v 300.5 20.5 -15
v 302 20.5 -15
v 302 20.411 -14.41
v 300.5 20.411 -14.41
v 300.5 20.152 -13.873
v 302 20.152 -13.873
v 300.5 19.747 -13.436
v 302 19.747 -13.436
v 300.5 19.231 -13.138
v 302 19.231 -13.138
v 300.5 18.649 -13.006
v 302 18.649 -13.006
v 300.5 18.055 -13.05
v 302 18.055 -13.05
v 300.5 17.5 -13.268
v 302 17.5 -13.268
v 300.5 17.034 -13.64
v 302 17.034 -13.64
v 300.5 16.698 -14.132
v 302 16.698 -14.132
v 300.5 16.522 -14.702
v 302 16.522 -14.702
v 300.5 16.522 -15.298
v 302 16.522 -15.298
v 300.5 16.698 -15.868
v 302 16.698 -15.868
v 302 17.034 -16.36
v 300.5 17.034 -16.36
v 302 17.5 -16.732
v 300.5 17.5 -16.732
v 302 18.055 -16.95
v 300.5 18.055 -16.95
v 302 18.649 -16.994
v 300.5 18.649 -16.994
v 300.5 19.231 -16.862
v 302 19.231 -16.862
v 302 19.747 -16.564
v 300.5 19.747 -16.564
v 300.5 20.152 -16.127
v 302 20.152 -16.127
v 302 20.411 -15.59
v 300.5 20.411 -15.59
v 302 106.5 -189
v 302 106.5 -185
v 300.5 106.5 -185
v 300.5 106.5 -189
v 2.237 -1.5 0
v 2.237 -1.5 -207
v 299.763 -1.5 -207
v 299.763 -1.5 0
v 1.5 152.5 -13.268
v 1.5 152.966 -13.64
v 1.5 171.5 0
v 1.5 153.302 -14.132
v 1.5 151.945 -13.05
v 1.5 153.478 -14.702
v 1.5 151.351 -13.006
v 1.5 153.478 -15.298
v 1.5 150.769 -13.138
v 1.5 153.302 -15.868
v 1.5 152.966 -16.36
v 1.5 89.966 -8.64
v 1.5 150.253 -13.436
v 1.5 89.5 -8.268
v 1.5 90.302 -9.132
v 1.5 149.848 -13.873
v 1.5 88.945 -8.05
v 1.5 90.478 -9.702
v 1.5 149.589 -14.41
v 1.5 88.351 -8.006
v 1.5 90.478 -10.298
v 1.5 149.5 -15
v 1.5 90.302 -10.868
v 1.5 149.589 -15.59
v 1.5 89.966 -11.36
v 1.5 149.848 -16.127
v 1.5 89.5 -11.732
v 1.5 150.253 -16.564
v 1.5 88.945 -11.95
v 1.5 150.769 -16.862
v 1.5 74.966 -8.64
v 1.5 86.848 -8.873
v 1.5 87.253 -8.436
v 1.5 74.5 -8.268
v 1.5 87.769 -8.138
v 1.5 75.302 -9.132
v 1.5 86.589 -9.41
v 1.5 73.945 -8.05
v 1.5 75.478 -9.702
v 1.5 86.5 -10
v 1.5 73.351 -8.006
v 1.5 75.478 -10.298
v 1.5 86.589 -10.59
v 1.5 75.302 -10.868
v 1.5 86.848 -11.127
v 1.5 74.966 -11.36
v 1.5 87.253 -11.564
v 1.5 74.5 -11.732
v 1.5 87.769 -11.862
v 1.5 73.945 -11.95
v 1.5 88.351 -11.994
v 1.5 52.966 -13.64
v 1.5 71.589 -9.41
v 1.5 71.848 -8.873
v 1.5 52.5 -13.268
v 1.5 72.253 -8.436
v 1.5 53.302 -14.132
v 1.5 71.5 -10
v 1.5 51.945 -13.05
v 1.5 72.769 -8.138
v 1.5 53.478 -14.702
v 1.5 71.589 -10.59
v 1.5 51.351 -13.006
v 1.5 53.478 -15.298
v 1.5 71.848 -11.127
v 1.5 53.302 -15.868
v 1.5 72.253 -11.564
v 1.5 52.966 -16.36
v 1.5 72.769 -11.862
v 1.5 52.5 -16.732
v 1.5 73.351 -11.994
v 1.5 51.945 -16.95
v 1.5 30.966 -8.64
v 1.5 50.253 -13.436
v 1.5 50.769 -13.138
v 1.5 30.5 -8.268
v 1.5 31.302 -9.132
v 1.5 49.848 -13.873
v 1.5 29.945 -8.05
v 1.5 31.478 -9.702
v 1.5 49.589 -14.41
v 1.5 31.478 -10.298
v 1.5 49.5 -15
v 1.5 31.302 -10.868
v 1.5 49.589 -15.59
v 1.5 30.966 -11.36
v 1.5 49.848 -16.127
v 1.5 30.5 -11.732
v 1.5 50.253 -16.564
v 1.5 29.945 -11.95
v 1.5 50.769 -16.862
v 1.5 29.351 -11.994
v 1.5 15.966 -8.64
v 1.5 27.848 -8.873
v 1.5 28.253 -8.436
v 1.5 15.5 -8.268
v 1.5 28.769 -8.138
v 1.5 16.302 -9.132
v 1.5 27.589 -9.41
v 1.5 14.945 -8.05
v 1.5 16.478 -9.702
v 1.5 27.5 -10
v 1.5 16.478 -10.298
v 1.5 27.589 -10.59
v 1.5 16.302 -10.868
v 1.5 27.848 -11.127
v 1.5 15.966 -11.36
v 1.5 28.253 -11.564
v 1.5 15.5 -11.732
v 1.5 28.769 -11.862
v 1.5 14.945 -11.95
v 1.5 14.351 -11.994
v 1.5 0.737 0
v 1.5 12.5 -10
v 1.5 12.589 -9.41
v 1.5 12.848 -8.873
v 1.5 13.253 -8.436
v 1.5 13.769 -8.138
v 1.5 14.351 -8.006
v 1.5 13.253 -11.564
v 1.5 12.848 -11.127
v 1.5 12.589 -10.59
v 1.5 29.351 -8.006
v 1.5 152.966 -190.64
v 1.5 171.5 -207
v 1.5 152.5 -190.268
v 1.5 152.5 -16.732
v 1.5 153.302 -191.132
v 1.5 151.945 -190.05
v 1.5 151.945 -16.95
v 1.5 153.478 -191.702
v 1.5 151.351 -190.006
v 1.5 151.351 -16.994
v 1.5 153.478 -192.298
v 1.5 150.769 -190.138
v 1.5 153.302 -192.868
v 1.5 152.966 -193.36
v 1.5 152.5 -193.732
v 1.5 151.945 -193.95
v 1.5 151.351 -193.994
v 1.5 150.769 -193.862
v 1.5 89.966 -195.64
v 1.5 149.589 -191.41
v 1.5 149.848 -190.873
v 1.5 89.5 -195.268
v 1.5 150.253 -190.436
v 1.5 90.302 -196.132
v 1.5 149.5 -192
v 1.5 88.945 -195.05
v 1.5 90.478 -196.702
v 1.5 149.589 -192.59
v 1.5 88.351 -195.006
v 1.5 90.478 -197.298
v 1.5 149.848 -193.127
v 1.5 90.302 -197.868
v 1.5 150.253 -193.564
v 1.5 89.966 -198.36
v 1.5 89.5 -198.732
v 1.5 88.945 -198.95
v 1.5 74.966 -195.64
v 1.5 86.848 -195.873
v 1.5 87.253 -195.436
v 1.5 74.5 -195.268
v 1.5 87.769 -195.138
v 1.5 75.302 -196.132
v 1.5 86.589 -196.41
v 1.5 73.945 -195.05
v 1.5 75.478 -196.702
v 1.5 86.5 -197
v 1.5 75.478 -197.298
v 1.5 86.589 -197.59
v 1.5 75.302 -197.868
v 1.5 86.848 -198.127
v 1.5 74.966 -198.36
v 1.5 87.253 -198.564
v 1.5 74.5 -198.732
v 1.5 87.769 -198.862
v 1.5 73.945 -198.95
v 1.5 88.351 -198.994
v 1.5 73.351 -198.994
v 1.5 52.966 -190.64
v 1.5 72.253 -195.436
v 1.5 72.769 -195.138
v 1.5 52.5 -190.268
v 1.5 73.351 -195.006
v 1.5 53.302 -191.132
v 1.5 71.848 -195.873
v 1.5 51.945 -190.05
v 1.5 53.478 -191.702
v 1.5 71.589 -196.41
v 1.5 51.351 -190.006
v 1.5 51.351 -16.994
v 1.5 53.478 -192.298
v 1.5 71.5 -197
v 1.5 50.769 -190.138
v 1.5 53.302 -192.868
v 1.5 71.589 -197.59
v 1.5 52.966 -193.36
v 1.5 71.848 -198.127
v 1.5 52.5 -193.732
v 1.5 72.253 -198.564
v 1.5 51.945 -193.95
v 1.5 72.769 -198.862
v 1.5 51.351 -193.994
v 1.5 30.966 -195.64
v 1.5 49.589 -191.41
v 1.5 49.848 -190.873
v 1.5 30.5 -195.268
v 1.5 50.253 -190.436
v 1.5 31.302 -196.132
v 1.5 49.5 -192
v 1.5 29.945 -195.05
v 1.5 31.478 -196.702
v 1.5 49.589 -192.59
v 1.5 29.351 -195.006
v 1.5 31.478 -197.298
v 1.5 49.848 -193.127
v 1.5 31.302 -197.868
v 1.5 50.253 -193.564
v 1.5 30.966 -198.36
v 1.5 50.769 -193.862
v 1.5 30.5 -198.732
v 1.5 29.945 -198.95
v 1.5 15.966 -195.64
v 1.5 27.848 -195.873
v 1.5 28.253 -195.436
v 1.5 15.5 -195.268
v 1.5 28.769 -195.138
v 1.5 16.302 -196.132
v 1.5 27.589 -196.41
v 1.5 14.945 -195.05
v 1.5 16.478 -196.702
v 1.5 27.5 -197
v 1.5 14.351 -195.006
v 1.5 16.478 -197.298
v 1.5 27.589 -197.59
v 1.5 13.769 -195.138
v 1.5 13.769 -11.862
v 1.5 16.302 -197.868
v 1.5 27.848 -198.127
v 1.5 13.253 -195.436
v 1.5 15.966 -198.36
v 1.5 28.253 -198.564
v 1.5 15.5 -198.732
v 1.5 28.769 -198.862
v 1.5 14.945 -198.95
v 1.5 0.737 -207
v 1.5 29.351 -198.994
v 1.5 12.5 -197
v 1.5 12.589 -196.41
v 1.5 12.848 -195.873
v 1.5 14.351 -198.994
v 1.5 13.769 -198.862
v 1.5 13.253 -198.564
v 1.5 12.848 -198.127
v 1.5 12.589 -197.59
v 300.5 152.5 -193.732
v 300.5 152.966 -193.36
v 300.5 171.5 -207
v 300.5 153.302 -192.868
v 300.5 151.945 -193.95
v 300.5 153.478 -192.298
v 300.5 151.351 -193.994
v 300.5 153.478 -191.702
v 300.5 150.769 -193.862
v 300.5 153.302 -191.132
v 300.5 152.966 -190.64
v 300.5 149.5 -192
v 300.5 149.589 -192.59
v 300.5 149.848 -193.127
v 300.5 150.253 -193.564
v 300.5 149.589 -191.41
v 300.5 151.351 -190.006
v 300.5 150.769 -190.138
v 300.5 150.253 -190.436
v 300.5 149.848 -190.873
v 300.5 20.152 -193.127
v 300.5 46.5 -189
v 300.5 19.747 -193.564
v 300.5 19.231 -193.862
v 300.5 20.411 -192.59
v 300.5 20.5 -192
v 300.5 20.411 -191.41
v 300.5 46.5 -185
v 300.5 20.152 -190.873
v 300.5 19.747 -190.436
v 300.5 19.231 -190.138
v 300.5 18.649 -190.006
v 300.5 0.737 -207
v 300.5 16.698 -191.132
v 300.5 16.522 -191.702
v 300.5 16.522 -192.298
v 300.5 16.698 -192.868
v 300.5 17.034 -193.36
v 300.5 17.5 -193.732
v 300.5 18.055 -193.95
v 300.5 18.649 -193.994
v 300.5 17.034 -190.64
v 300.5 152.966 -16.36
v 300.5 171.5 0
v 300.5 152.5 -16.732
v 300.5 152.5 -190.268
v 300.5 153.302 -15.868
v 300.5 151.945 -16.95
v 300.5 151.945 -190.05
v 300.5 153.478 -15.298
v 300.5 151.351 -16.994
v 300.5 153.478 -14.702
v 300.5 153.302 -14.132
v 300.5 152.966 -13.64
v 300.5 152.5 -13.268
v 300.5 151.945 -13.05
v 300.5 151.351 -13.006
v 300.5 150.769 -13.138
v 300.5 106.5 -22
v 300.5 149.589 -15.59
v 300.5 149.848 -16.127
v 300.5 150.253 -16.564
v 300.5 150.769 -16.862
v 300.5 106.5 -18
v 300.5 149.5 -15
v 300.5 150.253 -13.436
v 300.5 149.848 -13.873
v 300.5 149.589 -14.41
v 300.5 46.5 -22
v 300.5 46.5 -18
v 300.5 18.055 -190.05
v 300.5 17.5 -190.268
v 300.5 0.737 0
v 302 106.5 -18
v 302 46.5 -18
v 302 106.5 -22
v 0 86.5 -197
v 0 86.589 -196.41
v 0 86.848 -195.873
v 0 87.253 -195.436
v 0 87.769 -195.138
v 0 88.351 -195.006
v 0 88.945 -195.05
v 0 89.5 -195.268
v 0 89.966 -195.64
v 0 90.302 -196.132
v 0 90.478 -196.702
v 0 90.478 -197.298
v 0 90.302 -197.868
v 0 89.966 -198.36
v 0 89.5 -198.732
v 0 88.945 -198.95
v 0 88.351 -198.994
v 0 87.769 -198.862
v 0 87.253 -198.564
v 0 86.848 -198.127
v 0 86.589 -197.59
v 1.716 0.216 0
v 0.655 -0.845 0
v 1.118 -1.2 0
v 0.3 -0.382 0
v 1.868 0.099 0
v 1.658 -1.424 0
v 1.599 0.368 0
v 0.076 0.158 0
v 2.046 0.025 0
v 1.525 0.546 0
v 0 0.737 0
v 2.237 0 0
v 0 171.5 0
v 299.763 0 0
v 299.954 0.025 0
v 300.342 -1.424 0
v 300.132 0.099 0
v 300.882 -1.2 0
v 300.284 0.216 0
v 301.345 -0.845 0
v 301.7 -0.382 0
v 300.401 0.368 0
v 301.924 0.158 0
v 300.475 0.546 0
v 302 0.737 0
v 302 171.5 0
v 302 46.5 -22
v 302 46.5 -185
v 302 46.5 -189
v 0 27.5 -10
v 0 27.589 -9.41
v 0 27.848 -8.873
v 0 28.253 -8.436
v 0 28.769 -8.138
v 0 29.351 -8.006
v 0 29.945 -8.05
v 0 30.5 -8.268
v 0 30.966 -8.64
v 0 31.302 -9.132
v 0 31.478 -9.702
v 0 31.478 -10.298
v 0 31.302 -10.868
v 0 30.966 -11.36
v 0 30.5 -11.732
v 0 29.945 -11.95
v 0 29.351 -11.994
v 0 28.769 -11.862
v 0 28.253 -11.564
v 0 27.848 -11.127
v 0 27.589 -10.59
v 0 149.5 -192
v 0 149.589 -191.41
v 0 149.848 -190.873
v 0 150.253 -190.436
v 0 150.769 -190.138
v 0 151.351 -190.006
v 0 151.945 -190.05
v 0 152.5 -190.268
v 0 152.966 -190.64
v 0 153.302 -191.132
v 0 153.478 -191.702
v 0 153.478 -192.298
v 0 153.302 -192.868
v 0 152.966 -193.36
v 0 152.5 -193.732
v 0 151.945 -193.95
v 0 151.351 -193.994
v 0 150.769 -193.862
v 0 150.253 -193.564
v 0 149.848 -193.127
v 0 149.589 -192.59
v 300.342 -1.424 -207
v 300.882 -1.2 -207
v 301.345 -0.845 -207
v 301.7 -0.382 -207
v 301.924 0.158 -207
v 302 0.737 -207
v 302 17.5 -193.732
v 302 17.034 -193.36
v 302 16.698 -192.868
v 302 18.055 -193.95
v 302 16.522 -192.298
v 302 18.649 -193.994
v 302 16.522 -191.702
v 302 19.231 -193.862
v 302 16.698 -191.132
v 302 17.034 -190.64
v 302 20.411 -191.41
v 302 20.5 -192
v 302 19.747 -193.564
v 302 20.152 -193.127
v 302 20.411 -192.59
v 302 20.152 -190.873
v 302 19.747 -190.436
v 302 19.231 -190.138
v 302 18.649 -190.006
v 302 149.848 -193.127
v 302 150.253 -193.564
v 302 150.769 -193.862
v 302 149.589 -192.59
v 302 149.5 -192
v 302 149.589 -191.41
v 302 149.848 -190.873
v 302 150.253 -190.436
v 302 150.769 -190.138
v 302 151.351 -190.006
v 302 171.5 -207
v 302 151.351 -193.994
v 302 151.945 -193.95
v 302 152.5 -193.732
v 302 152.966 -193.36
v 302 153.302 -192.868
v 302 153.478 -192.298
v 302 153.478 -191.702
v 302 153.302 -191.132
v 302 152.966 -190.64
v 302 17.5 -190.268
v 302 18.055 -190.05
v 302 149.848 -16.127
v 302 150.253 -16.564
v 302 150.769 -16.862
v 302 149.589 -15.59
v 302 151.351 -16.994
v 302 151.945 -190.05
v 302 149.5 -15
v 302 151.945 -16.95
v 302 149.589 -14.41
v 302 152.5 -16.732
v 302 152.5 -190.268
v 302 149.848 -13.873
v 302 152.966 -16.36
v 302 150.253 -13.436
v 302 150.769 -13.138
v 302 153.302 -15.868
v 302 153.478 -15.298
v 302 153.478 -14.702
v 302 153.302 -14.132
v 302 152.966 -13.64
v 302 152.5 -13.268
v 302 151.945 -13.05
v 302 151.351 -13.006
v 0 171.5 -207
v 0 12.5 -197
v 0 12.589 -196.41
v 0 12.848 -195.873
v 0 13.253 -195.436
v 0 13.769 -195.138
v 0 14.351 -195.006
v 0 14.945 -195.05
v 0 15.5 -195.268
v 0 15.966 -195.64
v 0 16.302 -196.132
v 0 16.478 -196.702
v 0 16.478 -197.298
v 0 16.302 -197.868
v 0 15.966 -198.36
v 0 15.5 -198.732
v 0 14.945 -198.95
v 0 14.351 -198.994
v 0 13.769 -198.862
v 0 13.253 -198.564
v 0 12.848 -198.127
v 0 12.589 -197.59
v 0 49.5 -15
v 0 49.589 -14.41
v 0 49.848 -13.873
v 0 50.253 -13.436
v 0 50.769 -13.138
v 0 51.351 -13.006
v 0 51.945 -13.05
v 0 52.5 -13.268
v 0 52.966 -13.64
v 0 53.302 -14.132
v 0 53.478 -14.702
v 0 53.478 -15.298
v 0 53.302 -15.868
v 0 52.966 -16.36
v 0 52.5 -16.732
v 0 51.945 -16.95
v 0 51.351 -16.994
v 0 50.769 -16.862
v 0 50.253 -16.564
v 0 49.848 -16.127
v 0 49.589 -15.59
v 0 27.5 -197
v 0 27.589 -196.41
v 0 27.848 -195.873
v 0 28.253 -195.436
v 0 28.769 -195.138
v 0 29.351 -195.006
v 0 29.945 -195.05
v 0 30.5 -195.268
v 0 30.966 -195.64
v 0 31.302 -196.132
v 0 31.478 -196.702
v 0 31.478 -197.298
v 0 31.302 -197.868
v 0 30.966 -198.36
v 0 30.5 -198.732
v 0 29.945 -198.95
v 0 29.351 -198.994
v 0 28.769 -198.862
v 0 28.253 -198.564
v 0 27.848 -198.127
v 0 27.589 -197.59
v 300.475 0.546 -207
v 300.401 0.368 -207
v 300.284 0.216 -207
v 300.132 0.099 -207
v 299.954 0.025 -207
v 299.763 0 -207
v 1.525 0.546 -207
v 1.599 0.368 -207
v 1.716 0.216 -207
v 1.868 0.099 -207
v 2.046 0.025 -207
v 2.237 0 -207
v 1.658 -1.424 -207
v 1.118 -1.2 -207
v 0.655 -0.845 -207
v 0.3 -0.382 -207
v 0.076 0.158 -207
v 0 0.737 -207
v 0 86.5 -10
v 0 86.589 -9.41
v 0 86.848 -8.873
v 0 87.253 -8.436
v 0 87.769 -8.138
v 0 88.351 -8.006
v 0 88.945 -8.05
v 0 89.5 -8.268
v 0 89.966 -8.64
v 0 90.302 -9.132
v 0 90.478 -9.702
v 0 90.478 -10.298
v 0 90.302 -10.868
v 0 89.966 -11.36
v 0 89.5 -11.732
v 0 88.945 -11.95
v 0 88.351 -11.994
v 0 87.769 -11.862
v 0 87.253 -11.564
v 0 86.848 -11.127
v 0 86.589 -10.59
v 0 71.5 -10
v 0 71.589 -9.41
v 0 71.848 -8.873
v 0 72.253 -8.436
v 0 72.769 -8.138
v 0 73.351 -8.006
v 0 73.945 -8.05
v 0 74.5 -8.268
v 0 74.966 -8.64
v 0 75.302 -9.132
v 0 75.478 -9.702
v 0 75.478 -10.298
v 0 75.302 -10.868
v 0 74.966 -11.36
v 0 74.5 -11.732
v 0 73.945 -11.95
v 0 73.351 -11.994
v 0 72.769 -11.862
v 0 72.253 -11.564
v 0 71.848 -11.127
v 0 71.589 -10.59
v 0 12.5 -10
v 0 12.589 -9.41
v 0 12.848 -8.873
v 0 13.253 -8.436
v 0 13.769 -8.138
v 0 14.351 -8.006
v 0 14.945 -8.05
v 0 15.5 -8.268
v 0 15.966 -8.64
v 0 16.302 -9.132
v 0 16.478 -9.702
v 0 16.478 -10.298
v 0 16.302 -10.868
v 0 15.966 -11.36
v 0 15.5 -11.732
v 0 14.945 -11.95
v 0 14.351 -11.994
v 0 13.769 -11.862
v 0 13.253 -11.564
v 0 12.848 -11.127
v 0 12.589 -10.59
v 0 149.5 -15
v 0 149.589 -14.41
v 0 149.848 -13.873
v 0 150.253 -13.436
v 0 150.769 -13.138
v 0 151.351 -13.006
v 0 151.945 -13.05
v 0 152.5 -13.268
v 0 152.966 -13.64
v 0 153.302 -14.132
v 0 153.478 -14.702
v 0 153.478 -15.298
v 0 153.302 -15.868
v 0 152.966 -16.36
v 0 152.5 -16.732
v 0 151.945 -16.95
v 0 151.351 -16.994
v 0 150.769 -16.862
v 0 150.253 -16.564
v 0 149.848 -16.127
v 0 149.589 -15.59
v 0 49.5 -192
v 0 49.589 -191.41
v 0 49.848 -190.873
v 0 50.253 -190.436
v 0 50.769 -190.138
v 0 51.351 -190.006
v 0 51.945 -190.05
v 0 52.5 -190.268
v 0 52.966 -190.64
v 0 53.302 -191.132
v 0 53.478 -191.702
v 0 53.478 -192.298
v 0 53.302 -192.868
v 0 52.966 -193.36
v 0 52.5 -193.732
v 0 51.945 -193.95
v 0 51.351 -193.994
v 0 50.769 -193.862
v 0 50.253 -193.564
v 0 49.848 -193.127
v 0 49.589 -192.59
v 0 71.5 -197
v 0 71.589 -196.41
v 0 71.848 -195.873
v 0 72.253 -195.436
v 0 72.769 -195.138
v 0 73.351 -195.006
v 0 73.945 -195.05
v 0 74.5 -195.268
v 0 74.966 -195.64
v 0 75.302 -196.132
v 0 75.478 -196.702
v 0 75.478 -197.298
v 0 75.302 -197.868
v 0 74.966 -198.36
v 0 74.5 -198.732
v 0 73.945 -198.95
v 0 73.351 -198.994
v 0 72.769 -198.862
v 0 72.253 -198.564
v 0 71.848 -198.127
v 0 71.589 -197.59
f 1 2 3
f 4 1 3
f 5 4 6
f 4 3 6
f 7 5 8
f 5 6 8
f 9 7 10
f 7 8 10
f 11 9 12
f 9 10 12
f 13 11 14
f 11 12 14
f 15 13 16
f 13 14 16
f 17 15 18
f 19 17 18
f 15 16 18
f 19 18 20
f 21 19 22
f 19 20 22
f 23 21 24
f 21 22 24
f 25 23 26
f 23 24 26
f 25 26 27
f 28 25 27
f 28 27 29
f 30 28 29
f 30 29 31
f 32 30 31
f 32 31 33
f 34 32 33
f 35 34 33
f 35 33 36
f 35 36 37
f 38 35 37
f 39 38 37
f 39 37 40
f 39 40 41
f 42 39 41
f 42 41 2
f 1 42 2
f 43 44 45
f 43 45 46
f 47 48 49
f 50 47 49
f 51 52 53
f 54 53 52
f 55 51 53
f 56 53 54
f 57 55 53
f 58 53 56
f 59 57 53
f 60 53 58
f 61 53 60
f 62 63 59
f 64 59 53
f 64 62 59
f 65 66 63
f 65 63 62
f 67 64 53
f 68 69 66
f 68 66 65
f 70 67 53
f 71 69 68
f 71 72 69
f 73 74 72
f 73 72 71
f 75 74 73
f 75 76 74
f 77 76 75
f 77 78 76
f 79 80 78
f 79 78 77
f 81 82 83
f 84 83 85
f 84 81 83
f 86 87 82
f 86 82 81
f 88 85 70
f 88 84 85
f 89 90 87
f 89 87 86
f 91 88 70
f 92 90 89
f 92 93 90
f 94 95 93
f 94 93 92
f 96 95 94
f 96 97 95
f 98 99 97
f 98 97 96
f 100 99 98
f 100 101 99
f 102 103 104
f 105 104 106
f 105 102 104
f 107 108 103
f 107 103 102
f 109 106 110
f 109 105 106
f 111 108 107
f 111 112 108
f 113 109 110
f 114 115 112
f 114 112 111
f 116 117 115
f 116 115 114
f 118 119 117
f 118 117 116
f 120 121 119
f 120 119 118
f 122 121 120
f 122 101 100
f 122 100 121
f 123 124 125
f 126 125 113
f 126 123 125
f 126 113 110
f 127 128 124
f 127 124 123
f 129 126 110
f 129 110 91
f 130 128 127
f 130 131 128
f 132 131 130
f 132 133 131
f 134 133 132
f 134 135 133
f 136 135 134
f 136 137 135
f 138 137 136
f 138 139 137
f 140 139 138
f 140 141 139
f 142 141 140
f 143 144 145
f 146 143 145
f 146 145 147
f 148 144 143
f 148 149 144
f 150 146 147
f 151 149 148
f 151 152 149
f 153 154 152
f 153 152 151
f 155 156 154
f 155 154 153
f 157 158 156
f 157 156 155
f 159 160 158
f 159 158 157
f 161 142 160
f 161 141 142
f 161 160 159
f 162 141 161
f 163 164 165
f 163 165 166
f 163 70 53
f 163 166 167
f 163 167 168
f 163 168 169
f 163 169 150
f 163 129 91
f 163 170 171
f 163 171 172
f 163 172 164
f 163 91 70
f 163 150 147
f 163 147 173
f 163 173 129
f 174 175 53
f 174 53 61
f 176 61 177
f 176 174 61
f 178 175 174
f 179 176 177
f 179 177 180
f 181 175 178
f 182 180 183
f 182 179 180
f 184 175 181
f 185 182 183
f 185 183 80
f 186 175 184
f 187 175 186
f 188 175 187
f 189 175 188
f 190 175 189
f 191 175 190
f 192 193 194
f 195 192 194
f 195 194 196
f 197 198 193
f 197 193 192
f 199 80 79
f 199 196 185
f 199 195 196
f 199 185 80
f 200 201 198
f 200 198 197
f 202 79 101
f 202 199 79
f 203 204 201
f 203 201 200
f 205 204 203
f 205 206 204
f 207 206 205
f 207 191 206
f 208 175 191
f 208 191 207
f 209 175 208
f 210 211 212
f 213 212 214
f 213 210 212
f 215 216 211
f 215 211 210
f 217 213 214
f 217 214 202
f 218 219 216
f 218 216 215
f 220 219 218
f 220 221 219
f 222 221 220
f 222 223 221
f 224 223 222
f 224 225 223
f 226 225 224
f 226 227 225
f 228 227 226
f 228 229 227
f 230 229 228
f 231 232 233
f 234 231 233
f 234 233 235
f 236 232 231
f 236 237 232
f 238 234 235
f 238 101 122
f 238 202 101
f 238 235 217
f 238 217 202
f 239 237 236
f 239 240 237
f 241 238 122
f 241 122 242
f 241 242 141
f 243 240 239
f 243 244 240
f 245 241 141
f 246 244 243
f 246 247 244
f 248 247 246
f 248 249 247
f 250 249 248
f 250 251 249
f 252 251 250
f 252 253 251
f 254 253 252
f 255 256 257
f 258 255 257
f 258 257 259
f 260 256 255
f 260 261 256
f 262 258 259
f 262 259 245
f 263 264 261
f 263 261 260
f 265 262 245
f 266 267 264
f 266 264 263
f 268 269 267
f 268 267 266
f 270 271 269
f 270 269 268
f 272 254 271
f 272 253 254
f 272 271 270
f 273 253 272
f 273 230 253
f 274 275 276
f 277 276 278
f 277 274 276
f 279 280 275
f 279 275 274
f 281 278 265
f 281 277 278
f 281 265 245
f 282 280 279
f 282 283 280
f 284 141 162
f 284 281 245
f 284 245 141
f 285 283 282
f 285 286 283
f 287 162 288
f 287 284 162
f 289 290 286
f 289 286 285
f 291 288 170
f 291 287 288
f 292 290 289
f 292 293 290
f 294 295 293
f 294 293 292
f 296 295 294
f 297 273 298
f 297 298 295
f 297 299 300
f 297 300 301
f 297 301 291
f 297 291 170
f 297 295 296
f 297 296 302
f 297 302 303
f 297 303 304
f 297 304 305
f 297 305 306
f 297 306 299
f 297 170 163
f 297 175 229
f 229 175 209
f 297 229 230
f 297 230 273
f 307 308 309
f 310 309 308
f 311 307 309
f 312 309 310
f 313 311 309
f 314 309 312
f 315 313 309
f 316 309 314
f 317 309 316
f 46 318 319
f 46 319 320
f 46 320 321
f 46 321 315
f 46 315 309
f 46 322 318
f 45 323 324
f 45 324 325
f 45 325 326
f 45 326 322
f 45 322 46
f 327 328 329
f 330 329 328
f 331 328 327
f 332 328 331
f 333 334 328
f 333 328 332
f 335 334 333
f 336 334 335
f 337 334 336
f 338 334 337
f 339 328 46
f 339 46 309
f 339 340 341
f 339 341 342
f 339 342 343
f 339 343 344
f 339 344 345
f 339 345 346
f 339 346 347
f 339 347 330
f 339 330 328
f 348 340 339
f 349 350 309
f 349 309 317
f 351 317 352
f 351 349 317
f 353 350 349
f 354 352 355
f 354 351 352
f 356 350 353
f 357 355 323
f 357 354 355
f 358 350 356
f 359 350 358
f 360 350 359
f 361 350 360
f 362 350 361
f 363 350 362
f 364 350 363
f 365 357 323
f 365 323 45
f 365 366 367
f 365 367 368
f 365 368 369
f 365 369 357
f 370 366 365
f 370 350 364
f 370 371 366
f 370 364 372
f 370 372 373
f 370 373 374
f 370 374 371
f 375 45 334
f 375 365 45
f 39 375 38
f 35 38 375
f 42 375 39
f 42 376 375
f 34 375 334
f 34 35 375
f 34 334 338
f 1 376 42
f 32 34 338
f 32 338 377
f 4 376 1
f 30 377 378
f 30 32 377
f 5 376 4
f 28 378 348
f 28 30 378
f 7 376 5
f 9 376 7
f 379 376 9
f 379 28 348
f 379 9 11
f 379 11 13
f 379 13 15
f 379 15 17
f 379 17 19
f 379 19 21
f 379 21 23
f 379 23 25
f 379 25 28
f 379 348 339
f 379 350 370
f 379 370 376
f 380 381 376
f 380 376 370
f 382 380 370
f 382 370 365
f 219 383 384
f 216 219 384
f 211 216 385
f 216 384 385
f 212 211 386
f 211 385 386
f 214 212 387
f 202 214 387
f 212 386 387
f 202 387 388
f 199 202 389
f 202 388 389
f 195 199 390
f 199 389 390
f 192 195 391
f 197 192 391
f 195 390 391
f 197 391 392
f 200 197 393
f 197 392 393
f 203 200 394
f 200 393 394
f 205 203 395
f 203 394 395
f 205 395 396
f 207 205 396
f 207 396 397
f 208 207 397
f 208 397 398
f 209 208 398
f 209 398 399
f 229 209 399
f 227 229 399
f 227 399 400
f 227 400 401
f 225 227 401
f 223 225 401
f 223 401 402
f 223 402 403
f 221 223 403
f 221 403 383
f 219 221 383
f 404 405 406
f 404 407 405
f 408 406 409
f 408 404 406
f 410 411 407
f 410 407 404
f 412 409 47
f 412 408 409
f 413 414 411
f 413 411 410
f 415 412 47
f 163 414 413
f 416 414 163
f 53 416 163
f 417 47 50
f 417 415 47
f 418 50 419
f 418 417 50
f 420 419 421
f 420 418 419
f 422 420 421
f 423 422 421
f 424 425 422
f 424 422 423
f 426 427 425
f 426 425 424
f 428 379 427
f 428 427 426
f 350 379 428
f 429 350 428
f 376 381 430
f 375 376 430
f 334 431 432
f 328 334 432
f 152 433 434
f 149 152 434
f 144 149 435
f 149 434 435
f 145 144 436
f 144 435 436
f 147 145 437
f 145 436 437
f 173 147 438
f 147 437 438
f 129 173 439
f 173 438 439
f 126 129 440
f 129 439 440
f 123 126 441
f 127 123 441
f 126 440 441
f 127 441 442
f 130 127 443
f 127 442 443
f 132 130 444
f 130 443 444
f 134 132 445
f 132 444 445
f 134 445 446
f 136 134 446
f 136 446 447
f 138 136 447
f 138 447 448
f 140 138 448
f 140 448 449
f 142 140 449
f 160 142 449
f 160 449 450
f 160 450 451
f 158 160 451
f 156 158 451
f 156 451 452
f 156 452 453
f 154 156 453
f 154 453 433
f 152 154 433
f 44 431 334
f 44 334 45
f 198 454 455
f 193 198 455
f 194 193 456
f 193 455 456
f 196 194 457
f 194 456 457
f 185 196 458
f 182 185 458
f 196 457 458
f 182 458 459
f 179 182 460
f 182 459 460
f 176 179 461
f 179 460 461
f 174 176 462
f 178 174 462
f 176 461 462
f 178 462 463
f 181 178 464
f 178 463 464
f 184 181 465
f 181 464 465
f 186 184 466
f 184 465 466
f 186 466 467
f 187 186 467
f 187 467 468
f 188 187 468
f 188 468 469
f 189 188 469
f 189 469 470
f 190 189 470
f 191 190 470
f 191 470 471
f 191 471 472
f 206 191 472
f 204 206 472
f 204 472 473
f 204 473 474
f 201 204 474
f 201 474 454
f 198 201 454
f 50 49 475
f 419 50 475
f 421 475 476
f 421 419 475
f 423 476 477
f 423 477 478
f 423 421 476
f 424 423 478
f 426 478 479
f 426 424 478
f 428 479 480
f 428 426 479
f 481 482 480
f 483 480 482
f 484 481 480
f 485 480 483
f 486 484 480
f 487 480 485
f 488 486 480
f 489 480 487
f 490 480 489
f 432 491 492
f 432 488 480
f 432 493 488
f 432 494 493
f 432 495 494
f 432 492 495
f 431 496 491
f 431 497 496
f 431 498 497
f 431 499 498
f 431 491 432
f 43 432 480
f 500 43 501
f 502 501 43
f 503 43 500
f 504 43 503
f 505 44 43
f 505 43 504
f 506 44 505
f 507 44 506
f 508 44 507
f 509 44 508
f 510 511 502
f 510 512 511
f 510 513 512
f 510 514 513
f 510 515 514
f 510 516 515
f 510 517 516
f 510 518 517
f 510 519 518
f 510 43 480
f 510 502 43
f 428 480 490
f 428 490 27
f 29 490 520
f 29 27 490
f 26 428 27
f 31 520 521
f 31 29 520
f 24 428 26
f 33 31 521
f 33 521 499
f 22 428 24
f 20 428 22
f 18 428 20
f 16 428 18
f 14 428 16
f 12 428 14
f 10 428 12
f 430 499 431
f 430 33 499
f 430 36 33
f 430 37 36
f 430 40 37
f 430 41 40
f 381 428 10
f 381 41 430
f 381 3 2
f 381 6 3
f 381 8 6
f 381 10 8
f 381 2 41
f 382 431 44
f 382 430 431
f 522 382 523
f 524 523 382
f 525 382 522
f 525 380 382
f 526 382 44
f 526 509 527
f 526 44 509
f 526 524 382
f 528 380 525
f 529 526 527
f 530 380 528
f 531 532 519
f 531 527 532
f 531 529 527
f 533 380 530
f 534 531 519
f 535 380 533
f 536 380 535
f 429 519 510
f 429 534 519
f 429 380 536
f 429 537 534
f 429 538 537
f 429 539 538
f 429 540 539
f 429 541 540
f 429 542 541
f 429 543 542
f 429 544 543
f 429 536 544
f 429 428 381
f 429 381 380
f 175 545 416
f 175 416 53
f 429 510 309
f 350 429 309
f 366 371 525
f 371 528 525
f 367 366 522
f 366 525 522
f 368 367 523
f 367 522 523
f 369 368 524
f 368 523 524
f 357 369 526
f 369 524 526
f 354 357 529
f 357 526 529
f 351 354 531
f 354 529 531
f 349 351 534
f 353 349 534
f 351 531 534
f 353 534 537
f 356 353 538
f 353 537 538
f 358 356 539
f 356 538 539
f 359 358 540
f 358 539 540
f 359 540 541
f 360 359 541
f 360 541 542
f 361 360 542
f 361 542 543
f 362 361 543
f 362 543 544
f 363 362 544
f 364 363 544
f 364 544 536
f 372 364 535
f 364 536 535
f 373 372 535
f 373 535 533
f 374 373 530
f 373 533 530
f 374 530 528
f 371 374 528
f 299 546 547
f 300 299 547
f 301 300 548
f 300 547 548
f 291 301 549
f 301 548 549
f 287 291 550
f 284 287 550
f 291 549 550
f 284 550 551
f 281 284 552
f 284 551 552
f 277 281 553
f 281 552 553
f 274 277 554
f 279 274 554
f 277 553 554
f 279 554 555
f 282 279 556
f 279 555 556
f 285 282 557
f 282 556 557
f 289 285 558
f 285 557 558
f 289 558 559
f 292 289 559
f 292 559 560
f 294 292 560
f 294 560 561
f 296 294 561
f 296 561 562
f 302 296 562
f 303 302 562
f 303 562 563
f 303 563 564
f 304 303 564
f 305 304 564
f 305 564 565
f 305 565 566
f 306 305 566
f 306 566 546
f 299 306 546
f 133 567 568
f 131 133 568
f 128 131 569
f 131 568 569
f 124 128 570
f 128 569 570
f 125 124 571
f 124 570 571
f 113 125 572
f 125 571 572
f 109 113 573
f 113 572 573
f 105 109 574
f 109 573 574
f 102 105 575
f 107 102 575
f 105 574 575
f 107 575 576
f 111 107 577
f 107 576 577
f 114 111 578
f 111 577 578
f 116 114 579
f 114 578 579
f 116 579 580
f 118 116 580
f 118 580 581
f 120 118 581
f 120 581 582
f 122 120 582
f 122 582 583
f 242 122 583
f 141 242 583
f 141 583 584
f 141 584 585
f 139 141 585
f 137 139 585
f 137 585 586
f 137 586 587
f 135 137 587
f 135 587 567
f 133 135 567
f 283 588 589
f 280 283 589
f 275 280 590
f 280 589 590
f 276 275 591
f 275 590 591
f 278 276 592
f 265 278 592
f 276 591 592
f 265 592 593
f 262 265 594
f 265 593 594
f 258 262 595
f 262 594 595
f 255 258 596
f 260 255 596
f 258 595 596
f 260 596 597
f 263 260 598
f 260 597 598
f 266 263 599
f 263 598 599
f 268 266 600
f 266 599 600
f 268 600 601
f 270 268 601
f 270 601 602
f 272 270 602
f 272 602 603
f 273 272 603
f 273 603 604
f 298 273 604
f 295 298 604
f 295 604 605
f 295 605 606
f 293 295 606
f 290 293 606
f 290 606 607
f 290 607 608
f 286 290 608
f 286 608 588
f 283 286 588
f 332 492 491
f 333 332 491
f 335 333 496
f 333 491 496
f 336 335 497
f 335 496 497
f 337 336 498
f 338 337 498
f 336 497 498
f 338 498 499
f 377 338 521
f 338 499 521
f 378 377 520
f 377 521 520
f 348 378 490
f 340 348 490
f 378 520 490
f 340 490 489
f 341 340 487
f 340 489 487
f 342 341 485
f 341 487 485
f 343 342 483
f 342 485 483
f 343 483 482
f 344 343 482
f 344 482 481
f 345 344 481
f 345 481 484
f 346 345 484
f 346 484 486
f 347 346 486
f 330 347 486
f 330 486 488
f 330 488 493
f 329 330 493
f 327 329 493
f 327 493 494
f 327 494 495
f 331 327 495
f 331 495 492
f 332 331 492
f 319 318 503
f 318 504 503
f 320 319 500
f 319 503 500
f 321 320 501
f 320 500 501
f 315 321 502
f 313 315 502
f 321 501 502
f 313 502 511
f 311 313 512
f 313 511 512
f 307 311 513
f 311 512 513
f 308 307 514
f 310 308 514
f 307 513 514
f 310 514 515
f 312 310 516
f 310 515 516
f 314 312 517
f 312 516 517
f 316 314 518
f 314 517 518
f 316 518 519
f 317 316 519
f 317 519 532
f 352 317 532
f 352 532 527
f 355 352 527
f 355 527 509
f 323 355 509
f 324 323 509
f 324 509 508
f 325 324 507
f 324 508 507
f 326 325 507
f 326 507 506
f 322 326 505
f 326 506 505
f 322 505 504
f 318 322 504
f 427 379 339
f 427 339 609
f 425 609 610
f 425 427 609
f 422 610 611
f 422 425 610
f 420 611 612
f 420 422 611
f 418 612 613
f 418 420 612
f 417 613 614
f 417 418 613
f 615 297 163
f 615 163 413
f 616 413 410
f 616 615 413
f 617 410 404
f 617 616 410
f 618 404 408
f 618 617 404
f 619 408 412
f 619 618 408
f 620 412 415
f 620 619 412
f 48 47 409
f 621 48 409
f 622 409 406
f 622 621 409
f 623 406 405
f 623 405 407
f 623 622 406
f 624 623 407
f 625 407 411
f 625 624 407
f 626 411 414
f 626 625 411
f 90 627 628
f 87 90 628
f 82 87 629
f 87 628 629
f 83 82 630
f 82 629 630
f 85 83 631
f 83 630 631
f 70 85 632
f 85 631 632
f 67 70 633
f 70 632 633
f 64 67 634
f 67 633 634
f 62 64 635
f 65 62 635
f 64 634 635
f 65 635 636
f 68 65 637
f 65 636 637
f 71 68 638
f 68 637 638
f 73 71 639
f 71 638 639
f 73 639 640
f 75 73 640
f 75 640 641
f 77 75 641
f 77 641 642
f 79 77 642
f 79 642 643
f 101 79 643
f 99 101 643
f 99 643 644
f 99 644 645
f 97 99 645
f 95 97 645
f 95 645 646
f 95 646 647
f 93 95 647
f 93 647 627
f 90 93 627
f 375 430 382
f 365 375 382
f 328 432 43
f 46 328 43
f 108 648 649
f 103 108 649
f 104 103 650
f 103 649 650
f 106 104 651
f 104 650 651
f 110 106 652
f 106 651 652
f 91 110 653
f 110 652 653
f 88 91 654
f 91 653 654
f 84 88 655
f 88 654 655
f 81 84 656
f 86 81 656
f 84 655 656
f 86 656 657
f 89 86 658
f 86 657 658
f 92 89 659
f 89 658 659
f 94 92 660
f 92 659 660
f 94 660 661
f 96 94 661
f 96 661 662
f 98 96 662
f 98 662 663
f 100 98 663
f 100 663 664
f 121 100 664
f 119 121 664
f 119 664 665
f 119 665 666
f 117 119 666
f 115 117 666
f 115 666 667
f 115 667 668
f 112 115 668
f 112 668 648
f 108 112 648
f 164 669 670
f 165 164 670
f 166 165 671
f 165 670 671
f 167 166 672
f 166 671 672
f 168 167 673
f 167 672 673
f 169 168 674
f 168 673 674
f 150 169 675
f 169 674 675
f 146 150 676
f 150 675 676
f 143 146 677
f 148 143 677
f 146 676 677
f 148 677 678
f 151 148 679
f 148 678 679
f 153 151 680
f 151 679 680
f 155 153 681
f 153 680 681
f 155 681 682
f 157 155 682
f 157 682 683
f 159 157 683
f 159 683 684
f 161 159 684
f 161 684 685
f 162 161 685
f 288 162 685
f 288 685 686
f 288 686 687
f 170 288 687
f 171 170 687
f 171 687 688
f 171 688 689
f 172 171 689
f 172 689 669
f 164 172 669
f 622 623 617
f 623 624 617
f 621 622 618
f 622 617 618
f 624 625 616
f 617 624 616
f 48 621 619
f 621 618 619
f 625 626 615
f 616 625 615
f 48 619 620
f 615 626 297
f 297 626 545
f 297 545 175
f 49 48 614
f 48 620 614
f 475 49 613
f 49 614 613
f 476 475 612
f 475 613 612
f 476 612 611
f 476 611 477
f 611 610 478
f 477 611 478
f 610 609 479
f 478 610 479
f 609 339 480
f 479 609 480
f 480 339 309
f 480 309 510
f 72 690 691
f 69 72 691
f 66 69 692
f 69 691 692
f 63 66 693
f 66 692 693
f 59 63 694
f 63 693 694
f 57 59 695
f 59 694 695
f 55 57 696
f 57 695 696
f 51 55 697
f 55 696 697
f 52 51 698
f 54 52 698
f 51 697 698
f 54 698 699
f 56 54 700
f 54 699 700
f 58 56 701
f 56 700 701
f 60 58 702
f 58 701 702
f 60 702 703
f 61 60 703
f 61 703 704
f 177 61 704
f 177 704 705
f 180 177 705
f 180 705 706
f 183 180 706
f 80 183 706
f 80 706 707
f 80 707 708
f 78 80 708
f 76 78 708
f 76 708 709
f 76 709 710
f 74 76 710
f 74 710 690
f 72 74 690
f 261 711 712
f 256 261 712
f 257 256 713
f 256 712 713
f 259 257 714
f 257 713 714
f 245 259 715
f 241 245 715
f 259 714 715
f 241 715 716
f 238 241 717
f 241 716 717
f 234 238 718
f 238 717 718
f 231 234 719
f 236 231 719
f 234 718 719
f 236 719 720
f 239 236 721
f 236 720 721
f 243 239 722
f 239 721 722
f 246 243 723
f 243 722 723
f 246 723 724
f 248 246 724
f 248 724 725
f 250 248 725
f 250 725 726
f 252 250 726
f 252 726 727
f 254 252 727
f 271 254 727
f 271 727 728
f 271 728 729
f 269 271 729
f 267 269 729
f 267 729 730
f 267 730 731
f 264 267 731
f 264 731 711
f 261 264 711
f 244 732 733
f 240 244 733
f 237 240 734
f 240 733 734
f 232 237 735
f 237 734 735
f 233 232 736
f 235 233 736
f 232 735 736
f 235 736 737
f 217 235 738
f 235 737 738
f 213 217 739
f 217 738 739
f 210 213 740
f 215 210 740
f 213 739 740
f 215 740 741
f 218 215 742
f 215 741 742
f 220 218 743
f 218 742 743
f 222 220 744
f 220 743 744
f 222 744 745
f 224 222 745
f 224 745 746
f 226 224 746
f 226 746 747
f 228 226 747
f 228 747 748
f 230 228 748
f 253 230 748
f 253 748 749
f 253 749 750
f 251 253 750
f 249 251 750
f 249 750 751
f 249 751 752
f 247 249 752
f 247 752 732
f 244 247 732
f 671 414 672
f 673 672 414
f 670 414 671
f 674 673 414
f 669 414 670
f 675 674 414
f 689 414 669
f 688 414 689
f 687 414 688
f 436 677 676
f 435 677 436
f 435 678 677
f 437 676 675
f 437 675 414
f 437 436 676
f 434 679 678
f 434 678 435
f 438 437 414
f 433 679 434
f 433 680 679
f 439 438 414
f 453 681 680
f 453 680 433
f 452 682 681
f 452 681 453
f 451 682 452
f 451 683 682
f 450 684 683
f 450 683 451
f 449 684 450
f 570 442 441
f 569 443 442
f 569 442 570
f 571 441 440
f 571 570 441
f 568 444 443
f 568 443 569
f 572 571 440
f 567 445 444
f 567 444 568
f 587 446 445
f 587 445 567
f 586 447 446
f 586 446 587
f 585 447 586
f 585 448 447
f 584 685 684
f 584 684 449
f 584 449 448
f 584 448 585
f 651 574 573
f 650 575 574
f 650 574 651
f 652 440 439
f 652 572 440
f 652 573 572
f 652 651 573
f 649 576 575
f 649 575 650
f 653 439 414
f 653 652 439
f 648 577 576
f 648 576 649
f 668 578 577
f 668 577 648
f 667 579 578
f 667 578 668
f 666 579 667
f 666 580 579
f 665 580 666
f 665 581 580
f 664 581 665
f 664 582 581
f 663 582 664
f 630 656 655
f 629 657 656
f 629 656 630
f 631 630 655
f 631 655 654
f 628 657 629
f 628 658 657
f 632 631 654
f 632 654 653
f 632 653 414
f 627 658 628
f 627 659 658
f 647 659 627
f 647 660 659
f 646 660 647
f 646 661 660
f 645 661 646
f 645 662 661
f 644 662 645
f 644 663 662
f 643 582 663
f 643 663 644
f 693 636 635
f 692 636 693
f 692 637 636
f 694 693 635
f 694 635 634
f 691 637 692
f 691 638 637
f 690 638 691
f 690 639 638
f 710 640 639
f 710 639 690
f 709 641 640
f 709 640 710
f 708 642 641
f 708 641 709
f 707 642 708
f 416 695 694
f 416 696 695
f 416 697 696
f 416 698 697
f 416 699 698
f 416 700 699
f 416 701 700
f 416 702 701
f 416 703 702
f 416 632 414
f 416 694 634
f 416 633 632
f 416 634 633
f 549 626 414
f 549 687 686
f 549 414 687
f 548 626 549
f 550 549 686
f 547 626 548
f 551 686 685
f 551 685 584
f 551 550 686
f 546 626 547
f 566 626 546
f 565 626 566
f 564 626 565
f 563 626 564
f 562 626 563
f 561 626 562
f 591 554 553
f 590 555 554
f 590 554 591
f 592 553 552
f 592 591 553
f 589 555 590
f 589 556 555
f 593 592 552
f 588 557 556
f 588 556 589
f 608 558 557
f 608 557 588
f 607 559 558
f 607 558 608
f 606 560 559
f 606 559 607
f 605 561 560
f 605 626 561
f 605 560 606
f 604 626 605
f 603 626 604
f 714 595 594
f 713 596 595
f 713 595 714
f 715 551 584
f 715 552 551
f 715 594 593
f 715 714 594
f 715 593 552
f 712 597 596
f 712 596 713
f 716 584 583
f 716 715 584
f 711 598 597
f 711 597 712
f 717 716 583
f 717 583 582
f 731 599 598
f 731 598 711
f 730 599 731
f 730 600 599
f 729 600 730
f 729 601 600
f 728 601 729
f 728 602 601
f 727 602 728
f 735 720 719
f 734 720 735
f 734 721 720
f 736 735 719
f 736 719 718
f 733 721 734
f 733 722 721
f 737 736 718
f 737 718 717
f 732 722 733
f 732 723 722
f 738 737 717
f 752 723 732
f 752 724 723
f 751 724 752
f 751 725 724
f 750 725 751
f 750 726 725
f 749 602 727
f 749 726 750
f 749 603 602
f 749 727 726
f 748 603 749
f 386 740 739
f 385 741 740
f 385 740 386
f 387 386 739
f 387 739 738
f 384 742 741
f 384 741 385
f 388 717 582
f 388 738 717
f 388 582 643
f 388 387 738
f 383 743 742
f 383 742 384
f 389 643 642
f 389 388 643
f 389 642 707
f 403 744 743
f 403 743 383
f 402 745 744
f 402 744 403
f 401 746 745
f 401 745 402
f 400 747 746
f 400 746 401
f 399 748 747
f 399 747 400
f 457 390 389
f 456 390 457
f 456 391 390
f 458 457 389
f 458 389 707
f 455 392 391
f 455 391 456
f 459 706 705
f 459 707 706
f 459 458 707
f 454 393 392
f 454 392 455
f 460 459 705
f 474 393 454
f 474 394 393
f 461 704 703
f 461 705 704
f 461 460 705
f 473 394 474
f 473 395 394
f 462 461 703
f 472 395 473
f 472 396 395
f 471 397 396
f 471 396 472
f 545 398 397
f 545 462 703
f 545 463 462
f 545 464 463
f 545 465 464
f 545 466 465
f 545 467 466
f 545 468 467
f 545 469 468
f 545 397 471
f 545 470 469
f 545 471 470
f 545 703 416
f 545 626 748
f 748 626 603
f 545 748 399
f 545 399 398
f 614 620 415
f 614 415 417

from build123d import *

# Parameters (mm, degrees)
SKETCH_1_W                         = 302
SKETCH_1_H                         = 207
SM_BASE_FLANGE_1_DEPTH             = 1.5
SM_EDGE_FLANGE_1_STRIP_W           = 7.4732
SM_EDGE_FLANGE_1_STRIP_H           = 1.5
SM_EDGE_FLANGE_1_STRIP_CUT_DEPTH   = 207
SM_EDGE_FLANGE_1_STRIP_2_W         = 7.4732
SM_EDGE_FLANGE_1_STRIP_2_H         = 1.5
SM_EDGE_FLANGE_1_STRIP_CUT_2_DEPTH = 207
SM_EDGE_FLANGE_1_DEPTH             = 207
SM_EDGE_FLANGE_1_BEND_DEPTH        = 207
CUT_EXTRUDE_1_REACH                = 406.308
SKETCH_12_W                        = 4
SKETCH_12_H                        = 60
CUT_EXTRUDE_2_REACH                = 406.308
SKETCH_13_R                        = 2
CUT_EXTRUDE_3_REACH                = 406.308
SKETCH_14_R                        = 2
CUT_EXTRUDE_4_REACH                = 406.308
SKETCH_15_R                        = 2


# Sheet-metal steps are written as plain solids
with BuildPart() as part:
    # Sketch 1 → Базовая кромка1 (new body)
    with BuildSketch(Plane(origin=(0, 0, 0), x_dir=(1, 0, 0), z_dir=(0, 1, 0))):
        with Locations((151, 103.5)):
            Rectangle(SKETCH_1_W, SKETCH_1_H)
    extrude(amount=-SM_BASE_FLANGE_1_DEPTH)

    # Ребро-кромка1 strip (across the edge) → Ребро-кромка1 strip cut (cut)
    with BuildSketch(Plane.XY.offset(-207)):
        with Locations((-1.5, -0.75)):
            Rectangle(SM_EDGE_FLANGE_1_STRIP_W, SM_EDGE_FLANGE_1_STRIP_H)
    extrude(amount=SM_EDGE_FLANGE_1_STRIP_CUT_DEPTH, mode=Mode.SUBTRACT)

    # Ребро-кромка1 strip 2 (across the edge) → Ребро-кромка1 strip cut 2 (cut)
    with BuildSketch(Plane(origin=(302, 0, 0), x_dir=(-1, 0, 0), z_dir=(0, 0, -1))):
        with Locations((-1.5, -0.75)):
            Rectangle(SM_EDGE_FLANGE_1_STRIP_2_W, SM_EDGE_FLANGE_1_STRIP_2_H)
    extrude(amount=SM_EDGE_FLANGE_1_STRIP_CUT_2_DEPTH, mode=Mode.SUBTRACT)

    # Ребро-кромка1 section (across the edge) → Ребро-кромка1 (add)
    with BuildSketch(Plane.XY.offset(-207)):
        with BuildLine():
            Line((0, 0.7366), (0, 171.5))
            Line((0, 171.5), (1.5, 171.5))
            Line((1.5, 171.5), (1.5, 0.7366))
            ThreePointArc((1.5, 0.7366), (1.715745145, 0.215745145), (2.2366, 0))
            Line((2.2366, 0), (2.2366, -1.5))
            ThreePointArc((2.2366, -1.5), (0.655084973, -0.844915027), (0, 0.7366))
        make_face()
    extrude(amount=SM_EDGE_FLANGE_1_DEPTH)

    # Ребро-кромка1 section 2 (across the edge) → Ребро-кромка1 bend (add)
    with BuildSketch(Plane(origin=(302, 0, 0), x_dir=(-1, 0, 0), z_dir=(0, 0, -1))):
        with BuildLine():
            Line((0, 0.7366), (0, 171.5))
            Line((0, 171.5), (1.5, 171.5))
            Line((1.5, 171.5), (1.5, 0.7366))
            ThreePointArc((1.5, 0.7366), (1.715745145, 0.215745145), (2.2366, 0))
            Line((2.2366, 0), (2.2366, -1.5))
            ThreePointArc((2.2366, -1.5), (0.655084973, -0.844915027), (0, 0.7366))
        make_face()
    extrude(amount=SM_EDGE_FLANGE_1_BEND_DEPTH)

    # Эскиз12 → Вырез-Вытянуть1 (cut, up to next)
    with BuildSketch(Plane(origin=(302, 0, 0), x_dir=(0, 0, -1), z_dir=(1, 0, 0)), mode=Mode.PRIVATE) as cut_extrude_1_sk1:
        with Locations((187, 76.5)):
            Rectangle(SKETCH_12_W, SKETCH_12_H)
    cut_extrude_1_tool1 = extrude(cut_extrude_1_sk1.sketch, amount=-CUT_EXTRUDE_1_REACH, mode=Mode.PRIVATE) & part.part
    # Эскиз12 → Вырез-Вытянуть1 (cut, up to next)
    with BuildSketch(Plane(origin=(302, 0, 0), x_dir=(0, 0, -1), z_dir=(1, 0, 0)), mode=Mode.PRIVATE) as cut_extrude_1_sk2:
        with Locations((20, 76.5)):
            Rectangle(SKETCH_12_W, SKETCH_12_H)
    cut_extrude_1_tool2 = extrude(cut_extrude_1_sk2.sketch, amount=-CUT_EXTRUDE_1_REACH, mode=Mode.PRIVATE) & part.part
    add(cut_extrude_1_tool1.solids().sort_by_distance((302, 76.5, -187))[0], mode=Mode.SUBTRACT)
    add(cut_extrude_1_tool2.solids().sort_by_distance((302, 76.5, -20))[0], mode=Mode.SUBTRACT)

    # Эскиз13 → Вырез-Вытянуть2 (cut, up to next)
    with BuildSketch(Plane.ZY, mode=Mode.PRIVATE) as cut_extrude_2_sk1:
        with Locations(Location((-197, 88.5, 0), (0, 0, 270))):
            Circle(SKETCH_13_R)
    cut_extrude_2_tool1 = extrude(cut_extrude_2_sk1.sketch, amount=-CUT_EXTRUDE_2_REACH, mode=Mode.PRIVATE) & part.part
    # Эскиз13 → Вырез-Вытянуть2 (cut, up to next)
    with BuildSketch(Plane.ZY, mode=Mode.PRIVATE) as cut_extrude_2_sk2:
        with Locations(Location((-197, 73.5, 0), (0, 0, 270))):
            Circle(SKETCH_13_R)
    cut_extrude_2_tool2 = extrude(cut_extrude_2_sk2.sketch, amount=-CUT_EXTRUDE_2_REACH, mode=Mode.PRIVATE) & part.part
    # Эскиз13 → Вырез-Вытянуть2 (cut, up to next)
    with BuildSketch(Plane.ZY, mode=Mode.PRIVATE) as cut_extrude_2_sk3:
        with Locations(Location((-197, 29.5, 0), (0, 0, 270))):
            Circle(SKETCH_13_R)
    cut_extrude_2_tool3 = extrude(cut_extrude_2_sk3.sketch, amount=-CUT_EXTRUDE_2_REACH, mode=Mode.PRIVATE) & part.part
    # Эскиз13 → Вырез-Вытянуть2 (cut, up to next)
    with BuildSketch(Plane.ZY, mode=Mode.PRIVATE) as cut_extrude_2_sk4:
        with Locations(Location((-197, 14.5, 0), (0, 0, 270))):
            Circle(SKETCH_13_R)
    cut_extrude_2_tool4 = extrude(cut_extrude_2_sk4.sketch, amount=-CUT_EXTRUDE_2_REACH, mode=Mode.PRIVATE) & part.part
    # Эскиз13 → Вырез-Вытянуть2 (cut, up to next)
    with BuildSketch(Plane.ZY, mode=Mode.PRIVATE) as cut_extrude_2_sk5:
        with Locations(Location((-10, 14.5, 0), (0, 0, 270))):
            Circle(SKETCH_13_R)
    cut_extrude_2_tool5 = extrude(cut_extrude_2_sk5.sketch, amount=-CUT_EXTRUDE_2_REACH, mode=Mode.PRIVATE) & part.part
    # Эскиз13 → Вырез-Вытянуть2 (cut, up to next)
    with BuildSketch(Plane.ZY, mode=Mode.PRIVATE) as cut_extrude_2_sk6:
        with Locations(Location((-10, 29.5, 0), (0, 0, 270))):
            Circle(SKETCH_13_R)
    cut_extrude_2_tool6 = extrude(cut_extrude_2_sk6.sketch, amount=-CUT_EXTRUDE_2_REACH, mode=Mode.PRIVATE) & part.part
    # Эскиз13 → Вырез-Вытянуть2 (cut, up to next)
    with BuildSketch(Plane.ZY, mode=Mode.PRIVATE) as cut_extrude_2_sk7:
        with Locations(Location((-10, 73.5, 0), (0, 0, 270))):
            Circle(SKETCH_13_R)
    cut_extrude_2_tool7 = extrude(cut_extrude_2_sk7.sketch, amount=-CUT_EXTRUDE_2_REACH, mode=Mode.PRIVATE) & part.part
    # Эскиз13 → Вырез-Вытянуть2 (cut, up to next)
    with BuildSketch(Plane.ZY, mode=Mode.PRIVATE) as cut_extrude_2_sk8:
        with Locations(Location((-10, 88.5, 0), (0, 0, 270))):
            Circle(SKETCH_13_R)
    cut_extrude_2_tool8 = extrude(cut_extrude_2_sk8.sketch, amount=-CUT_EXTRUDE_2_REACH, mode=Mode.PRIVATE) & part.part
    add(cut_extrude_2_tool1.solids().sort_by_distance((0, 88.5, -197))[0], mode=Mode.SUBTRACT)
    add(cut_extrude_2_tool2.solids().sort_by_distance((0, 73.5, -197))[0], mode=Mode.SUBTRACT)
    add(cut_extrude_2_tool3.solids().sort_by_distance((0, 29.5, -197))[0], mode=Mode.SUBTRACT)
    add(cut_extrude_2_tool4.solids().sort_by_distance((0, 14.5, -197))[0], mode=Mode.SUBTRACT)
    add(cut_extrude_2_tool5.solids().sort_by_distance((0, 14.5, -10))[0], mode=Mode.SUBTRACT)
    add(cut_extrude_2_tool6.solids().sort_by_distance((0, 29.5, -10))[0], mode=Mode.SUBTRACT)
    add(cut_extrude_2_tool7.solids().sort_by_distance((0, 73.5, -10))[0], mode=Mode.SUBTRACT)
    add(cut_extrude_2_tool8.solids().sort_by_distance((0, 88.5, -10))[0], mode=Mode.SUBTRACT)

    # Эскиз14 → Вырез-Вытянуть3 (cut, up to next)
    with BuildSketch(Plane.ZY, mode=Mode.PRIVATE) as cut_extrude_3_sk1:
        with Locations(Location((-192, 151.5, 0), (0, 0, 270))):
            Circle(SKETCH_14_R)
    cut_extrude_3_tool1 = extrude(cut_extrude_3_sk1.sketch, amount=-CUT_EXTRUDE_3_REACH, mode=Mode.PRIVATE) & part.part
    # Эскиз14 → Вырез-Вытянуть3 (cut, up to next)
    with BuildSketch(Plane.ZY, mode=Mode.PRIVATE) as cut_extrude_3_sk2:
        with Locations(Location((-15, 151.5, 0), (0, 0, 270))):
            Circle(SKETCH_14_R)
    cut_extrude_3_tool2 = extrude(cut_extrude_3_sk2.sketch, amount=-CUT_EXTRUDE_3_REACH, mode=Mode.PRIVATE) & part.part
    # Эскиз14 → Вырез-Вытянуть3 (cut, up to next)
    with BuildSketch(Plane.ZY, mode=Mode.PRIVATE) as cut_extrude_3_sk3:
        with Locations(Location((-15, 51.5, 0), (0, 0, 270))):
            Circle(SKETCH_14_R)
    cut_extrude_3_tool3 = extrude(cut_extrude_3_sk3.sketch, amount=-CUT_EXTRUDE_3_REACH, mode=Mode.PRIVATE) & part.part
    # Эскиз14 → Вырез-Вытянуть3 (cut, up to next)
    with BuildSketch(Plane.ZY, mode=Mode.PRIVATE) as cut_extrude_3_sk4:
        with Locations(Location((-192, 51.5, 0), (0, 0, 270))):
            Circle(SKETCH_14_R)
    cut_extrude_3_tool4 = extrude(cut_extrude_3_sk4.sketch, amount=-CUT_EXTRUDE_3_REACH, mode=Mode.PRIVATE) & part.part
    add(cut_extrude_3_tool1.solids().sort_by_distance((0, 151.5, -192))[0], mode=Mode.SUBTRACT)
    add(cut_extrude_3_tool2.solids().sort_by_distance((0, 151.5, -15))[0], mode=Mode.SUBTRACT)
    add(cut_extrude_3_tool3.solids().sort_by_distance((0, 51.5, -15))[0], mode=Mode.SUBTRACT)
    add(cut_extrude_3_tool4.solids().sort_by_distance((0, 51.5, -192))[0], mode=Mode.SUBTRACT)

    # Эскиз15 → Вырез-Вытянуть4 (cut, up to next)
    with BuildSketch(Plane(origin=(302, 0, 0), x_dir=(0, 0, -1), z_dir=(1, 0, 0)), mode=Mode.PRIVATE) as cut_extrude_4_sk1:
        with Locations(Location((15, 151.5, 0), (0, 0, 270))):
            Circle(SKETCH_15_R)
    cut_extrude_4_tool1 = extrude(cut_extrude_4_sk1.sketch, amount=-CUT_EXTRUDE_4_REACH, mode=Mode.PRIVATE) & part.part
    # Эскиз15 → Вырез-Вытянуть4 (cut, up to next)
    with BuildSketch(Plane(origin=(302, 0, 0), x_dir=(0, 0, -1), z_dir=(1, 0, 0)), mode=Mode.PRIVATE) as cut_extrude_4_sk2:
        with Locations(Location((192, 151.5, 0), (0, 0, 270))):
            Circle(SKETCH_15_R)
    cut_extrude_4_tool2 = extrude(cut_extrude_4_sk2.sketch, amount=-CUT_EXTRUDE_4_REACH, mode=Mode.PRIVATE) & part.part
    # Эскиз15 → Вырез-Вытянуть4 (cut, up to next)
    with BuildSketch(Plane(origin=(302, 0, 0), x_dir=(0, 0, -1), z_dir=(1, 0, 0)), mode=Mode.PRIVATE) as cut_extrude_4_sk3:
        with Locations(Location((15, 18.5, 0), (0, 0, 90))):
            Circle(SKETCH_15_R)
    cut_extrude_4_tool3 = extrude(cut_extrude_4_sk3.sketch, amount=-CUT_EXTRUDE_4_REACH, mode=Mode.PRIVATE) & part.part
    # Эскиз15 → Вырез-Вытянуть4 (cut, up to next)
    with BuildSketch(Plane(origin=(302, 0, 0), x_dir=(0, 0, -1), z_dir=(1, 0, 0)), mode=Mode.PRIVATE) as cut_extrude_4_sk4:
        with Locations(Location((192, 18.5, 0), (0, 0, 90))):
            Circle(SKETCH_15_R)
    cut_extrude_4_tool4 = extrude(cut_extrude_4_sk4.sketch, amount=-CUT_EXTRUDE_4_REACH, mode=Mode.PRIVATE) & part.part
    add(cut_extrude_4_tool1.solids().sort_by_distance((302, 151.5, -15))[0], mode=Mode.SUBTRACT)
    add(cut_extrude_4_tool2.solids().sort_by_distance((302, 151.5, -192))[0], mode=Mode.SUBTRACT)
    add(cut_extrude_4_tool3.solids().sort_by_distance((302, 18.5, -15))[0], mode=Mode.SUBTRACT)
    add(cut_extrude_4_tool4.solids().sort_by_distance((302, 18.5, -192))[0], mode=Mode.SUBTRACT)


solid = part.part
